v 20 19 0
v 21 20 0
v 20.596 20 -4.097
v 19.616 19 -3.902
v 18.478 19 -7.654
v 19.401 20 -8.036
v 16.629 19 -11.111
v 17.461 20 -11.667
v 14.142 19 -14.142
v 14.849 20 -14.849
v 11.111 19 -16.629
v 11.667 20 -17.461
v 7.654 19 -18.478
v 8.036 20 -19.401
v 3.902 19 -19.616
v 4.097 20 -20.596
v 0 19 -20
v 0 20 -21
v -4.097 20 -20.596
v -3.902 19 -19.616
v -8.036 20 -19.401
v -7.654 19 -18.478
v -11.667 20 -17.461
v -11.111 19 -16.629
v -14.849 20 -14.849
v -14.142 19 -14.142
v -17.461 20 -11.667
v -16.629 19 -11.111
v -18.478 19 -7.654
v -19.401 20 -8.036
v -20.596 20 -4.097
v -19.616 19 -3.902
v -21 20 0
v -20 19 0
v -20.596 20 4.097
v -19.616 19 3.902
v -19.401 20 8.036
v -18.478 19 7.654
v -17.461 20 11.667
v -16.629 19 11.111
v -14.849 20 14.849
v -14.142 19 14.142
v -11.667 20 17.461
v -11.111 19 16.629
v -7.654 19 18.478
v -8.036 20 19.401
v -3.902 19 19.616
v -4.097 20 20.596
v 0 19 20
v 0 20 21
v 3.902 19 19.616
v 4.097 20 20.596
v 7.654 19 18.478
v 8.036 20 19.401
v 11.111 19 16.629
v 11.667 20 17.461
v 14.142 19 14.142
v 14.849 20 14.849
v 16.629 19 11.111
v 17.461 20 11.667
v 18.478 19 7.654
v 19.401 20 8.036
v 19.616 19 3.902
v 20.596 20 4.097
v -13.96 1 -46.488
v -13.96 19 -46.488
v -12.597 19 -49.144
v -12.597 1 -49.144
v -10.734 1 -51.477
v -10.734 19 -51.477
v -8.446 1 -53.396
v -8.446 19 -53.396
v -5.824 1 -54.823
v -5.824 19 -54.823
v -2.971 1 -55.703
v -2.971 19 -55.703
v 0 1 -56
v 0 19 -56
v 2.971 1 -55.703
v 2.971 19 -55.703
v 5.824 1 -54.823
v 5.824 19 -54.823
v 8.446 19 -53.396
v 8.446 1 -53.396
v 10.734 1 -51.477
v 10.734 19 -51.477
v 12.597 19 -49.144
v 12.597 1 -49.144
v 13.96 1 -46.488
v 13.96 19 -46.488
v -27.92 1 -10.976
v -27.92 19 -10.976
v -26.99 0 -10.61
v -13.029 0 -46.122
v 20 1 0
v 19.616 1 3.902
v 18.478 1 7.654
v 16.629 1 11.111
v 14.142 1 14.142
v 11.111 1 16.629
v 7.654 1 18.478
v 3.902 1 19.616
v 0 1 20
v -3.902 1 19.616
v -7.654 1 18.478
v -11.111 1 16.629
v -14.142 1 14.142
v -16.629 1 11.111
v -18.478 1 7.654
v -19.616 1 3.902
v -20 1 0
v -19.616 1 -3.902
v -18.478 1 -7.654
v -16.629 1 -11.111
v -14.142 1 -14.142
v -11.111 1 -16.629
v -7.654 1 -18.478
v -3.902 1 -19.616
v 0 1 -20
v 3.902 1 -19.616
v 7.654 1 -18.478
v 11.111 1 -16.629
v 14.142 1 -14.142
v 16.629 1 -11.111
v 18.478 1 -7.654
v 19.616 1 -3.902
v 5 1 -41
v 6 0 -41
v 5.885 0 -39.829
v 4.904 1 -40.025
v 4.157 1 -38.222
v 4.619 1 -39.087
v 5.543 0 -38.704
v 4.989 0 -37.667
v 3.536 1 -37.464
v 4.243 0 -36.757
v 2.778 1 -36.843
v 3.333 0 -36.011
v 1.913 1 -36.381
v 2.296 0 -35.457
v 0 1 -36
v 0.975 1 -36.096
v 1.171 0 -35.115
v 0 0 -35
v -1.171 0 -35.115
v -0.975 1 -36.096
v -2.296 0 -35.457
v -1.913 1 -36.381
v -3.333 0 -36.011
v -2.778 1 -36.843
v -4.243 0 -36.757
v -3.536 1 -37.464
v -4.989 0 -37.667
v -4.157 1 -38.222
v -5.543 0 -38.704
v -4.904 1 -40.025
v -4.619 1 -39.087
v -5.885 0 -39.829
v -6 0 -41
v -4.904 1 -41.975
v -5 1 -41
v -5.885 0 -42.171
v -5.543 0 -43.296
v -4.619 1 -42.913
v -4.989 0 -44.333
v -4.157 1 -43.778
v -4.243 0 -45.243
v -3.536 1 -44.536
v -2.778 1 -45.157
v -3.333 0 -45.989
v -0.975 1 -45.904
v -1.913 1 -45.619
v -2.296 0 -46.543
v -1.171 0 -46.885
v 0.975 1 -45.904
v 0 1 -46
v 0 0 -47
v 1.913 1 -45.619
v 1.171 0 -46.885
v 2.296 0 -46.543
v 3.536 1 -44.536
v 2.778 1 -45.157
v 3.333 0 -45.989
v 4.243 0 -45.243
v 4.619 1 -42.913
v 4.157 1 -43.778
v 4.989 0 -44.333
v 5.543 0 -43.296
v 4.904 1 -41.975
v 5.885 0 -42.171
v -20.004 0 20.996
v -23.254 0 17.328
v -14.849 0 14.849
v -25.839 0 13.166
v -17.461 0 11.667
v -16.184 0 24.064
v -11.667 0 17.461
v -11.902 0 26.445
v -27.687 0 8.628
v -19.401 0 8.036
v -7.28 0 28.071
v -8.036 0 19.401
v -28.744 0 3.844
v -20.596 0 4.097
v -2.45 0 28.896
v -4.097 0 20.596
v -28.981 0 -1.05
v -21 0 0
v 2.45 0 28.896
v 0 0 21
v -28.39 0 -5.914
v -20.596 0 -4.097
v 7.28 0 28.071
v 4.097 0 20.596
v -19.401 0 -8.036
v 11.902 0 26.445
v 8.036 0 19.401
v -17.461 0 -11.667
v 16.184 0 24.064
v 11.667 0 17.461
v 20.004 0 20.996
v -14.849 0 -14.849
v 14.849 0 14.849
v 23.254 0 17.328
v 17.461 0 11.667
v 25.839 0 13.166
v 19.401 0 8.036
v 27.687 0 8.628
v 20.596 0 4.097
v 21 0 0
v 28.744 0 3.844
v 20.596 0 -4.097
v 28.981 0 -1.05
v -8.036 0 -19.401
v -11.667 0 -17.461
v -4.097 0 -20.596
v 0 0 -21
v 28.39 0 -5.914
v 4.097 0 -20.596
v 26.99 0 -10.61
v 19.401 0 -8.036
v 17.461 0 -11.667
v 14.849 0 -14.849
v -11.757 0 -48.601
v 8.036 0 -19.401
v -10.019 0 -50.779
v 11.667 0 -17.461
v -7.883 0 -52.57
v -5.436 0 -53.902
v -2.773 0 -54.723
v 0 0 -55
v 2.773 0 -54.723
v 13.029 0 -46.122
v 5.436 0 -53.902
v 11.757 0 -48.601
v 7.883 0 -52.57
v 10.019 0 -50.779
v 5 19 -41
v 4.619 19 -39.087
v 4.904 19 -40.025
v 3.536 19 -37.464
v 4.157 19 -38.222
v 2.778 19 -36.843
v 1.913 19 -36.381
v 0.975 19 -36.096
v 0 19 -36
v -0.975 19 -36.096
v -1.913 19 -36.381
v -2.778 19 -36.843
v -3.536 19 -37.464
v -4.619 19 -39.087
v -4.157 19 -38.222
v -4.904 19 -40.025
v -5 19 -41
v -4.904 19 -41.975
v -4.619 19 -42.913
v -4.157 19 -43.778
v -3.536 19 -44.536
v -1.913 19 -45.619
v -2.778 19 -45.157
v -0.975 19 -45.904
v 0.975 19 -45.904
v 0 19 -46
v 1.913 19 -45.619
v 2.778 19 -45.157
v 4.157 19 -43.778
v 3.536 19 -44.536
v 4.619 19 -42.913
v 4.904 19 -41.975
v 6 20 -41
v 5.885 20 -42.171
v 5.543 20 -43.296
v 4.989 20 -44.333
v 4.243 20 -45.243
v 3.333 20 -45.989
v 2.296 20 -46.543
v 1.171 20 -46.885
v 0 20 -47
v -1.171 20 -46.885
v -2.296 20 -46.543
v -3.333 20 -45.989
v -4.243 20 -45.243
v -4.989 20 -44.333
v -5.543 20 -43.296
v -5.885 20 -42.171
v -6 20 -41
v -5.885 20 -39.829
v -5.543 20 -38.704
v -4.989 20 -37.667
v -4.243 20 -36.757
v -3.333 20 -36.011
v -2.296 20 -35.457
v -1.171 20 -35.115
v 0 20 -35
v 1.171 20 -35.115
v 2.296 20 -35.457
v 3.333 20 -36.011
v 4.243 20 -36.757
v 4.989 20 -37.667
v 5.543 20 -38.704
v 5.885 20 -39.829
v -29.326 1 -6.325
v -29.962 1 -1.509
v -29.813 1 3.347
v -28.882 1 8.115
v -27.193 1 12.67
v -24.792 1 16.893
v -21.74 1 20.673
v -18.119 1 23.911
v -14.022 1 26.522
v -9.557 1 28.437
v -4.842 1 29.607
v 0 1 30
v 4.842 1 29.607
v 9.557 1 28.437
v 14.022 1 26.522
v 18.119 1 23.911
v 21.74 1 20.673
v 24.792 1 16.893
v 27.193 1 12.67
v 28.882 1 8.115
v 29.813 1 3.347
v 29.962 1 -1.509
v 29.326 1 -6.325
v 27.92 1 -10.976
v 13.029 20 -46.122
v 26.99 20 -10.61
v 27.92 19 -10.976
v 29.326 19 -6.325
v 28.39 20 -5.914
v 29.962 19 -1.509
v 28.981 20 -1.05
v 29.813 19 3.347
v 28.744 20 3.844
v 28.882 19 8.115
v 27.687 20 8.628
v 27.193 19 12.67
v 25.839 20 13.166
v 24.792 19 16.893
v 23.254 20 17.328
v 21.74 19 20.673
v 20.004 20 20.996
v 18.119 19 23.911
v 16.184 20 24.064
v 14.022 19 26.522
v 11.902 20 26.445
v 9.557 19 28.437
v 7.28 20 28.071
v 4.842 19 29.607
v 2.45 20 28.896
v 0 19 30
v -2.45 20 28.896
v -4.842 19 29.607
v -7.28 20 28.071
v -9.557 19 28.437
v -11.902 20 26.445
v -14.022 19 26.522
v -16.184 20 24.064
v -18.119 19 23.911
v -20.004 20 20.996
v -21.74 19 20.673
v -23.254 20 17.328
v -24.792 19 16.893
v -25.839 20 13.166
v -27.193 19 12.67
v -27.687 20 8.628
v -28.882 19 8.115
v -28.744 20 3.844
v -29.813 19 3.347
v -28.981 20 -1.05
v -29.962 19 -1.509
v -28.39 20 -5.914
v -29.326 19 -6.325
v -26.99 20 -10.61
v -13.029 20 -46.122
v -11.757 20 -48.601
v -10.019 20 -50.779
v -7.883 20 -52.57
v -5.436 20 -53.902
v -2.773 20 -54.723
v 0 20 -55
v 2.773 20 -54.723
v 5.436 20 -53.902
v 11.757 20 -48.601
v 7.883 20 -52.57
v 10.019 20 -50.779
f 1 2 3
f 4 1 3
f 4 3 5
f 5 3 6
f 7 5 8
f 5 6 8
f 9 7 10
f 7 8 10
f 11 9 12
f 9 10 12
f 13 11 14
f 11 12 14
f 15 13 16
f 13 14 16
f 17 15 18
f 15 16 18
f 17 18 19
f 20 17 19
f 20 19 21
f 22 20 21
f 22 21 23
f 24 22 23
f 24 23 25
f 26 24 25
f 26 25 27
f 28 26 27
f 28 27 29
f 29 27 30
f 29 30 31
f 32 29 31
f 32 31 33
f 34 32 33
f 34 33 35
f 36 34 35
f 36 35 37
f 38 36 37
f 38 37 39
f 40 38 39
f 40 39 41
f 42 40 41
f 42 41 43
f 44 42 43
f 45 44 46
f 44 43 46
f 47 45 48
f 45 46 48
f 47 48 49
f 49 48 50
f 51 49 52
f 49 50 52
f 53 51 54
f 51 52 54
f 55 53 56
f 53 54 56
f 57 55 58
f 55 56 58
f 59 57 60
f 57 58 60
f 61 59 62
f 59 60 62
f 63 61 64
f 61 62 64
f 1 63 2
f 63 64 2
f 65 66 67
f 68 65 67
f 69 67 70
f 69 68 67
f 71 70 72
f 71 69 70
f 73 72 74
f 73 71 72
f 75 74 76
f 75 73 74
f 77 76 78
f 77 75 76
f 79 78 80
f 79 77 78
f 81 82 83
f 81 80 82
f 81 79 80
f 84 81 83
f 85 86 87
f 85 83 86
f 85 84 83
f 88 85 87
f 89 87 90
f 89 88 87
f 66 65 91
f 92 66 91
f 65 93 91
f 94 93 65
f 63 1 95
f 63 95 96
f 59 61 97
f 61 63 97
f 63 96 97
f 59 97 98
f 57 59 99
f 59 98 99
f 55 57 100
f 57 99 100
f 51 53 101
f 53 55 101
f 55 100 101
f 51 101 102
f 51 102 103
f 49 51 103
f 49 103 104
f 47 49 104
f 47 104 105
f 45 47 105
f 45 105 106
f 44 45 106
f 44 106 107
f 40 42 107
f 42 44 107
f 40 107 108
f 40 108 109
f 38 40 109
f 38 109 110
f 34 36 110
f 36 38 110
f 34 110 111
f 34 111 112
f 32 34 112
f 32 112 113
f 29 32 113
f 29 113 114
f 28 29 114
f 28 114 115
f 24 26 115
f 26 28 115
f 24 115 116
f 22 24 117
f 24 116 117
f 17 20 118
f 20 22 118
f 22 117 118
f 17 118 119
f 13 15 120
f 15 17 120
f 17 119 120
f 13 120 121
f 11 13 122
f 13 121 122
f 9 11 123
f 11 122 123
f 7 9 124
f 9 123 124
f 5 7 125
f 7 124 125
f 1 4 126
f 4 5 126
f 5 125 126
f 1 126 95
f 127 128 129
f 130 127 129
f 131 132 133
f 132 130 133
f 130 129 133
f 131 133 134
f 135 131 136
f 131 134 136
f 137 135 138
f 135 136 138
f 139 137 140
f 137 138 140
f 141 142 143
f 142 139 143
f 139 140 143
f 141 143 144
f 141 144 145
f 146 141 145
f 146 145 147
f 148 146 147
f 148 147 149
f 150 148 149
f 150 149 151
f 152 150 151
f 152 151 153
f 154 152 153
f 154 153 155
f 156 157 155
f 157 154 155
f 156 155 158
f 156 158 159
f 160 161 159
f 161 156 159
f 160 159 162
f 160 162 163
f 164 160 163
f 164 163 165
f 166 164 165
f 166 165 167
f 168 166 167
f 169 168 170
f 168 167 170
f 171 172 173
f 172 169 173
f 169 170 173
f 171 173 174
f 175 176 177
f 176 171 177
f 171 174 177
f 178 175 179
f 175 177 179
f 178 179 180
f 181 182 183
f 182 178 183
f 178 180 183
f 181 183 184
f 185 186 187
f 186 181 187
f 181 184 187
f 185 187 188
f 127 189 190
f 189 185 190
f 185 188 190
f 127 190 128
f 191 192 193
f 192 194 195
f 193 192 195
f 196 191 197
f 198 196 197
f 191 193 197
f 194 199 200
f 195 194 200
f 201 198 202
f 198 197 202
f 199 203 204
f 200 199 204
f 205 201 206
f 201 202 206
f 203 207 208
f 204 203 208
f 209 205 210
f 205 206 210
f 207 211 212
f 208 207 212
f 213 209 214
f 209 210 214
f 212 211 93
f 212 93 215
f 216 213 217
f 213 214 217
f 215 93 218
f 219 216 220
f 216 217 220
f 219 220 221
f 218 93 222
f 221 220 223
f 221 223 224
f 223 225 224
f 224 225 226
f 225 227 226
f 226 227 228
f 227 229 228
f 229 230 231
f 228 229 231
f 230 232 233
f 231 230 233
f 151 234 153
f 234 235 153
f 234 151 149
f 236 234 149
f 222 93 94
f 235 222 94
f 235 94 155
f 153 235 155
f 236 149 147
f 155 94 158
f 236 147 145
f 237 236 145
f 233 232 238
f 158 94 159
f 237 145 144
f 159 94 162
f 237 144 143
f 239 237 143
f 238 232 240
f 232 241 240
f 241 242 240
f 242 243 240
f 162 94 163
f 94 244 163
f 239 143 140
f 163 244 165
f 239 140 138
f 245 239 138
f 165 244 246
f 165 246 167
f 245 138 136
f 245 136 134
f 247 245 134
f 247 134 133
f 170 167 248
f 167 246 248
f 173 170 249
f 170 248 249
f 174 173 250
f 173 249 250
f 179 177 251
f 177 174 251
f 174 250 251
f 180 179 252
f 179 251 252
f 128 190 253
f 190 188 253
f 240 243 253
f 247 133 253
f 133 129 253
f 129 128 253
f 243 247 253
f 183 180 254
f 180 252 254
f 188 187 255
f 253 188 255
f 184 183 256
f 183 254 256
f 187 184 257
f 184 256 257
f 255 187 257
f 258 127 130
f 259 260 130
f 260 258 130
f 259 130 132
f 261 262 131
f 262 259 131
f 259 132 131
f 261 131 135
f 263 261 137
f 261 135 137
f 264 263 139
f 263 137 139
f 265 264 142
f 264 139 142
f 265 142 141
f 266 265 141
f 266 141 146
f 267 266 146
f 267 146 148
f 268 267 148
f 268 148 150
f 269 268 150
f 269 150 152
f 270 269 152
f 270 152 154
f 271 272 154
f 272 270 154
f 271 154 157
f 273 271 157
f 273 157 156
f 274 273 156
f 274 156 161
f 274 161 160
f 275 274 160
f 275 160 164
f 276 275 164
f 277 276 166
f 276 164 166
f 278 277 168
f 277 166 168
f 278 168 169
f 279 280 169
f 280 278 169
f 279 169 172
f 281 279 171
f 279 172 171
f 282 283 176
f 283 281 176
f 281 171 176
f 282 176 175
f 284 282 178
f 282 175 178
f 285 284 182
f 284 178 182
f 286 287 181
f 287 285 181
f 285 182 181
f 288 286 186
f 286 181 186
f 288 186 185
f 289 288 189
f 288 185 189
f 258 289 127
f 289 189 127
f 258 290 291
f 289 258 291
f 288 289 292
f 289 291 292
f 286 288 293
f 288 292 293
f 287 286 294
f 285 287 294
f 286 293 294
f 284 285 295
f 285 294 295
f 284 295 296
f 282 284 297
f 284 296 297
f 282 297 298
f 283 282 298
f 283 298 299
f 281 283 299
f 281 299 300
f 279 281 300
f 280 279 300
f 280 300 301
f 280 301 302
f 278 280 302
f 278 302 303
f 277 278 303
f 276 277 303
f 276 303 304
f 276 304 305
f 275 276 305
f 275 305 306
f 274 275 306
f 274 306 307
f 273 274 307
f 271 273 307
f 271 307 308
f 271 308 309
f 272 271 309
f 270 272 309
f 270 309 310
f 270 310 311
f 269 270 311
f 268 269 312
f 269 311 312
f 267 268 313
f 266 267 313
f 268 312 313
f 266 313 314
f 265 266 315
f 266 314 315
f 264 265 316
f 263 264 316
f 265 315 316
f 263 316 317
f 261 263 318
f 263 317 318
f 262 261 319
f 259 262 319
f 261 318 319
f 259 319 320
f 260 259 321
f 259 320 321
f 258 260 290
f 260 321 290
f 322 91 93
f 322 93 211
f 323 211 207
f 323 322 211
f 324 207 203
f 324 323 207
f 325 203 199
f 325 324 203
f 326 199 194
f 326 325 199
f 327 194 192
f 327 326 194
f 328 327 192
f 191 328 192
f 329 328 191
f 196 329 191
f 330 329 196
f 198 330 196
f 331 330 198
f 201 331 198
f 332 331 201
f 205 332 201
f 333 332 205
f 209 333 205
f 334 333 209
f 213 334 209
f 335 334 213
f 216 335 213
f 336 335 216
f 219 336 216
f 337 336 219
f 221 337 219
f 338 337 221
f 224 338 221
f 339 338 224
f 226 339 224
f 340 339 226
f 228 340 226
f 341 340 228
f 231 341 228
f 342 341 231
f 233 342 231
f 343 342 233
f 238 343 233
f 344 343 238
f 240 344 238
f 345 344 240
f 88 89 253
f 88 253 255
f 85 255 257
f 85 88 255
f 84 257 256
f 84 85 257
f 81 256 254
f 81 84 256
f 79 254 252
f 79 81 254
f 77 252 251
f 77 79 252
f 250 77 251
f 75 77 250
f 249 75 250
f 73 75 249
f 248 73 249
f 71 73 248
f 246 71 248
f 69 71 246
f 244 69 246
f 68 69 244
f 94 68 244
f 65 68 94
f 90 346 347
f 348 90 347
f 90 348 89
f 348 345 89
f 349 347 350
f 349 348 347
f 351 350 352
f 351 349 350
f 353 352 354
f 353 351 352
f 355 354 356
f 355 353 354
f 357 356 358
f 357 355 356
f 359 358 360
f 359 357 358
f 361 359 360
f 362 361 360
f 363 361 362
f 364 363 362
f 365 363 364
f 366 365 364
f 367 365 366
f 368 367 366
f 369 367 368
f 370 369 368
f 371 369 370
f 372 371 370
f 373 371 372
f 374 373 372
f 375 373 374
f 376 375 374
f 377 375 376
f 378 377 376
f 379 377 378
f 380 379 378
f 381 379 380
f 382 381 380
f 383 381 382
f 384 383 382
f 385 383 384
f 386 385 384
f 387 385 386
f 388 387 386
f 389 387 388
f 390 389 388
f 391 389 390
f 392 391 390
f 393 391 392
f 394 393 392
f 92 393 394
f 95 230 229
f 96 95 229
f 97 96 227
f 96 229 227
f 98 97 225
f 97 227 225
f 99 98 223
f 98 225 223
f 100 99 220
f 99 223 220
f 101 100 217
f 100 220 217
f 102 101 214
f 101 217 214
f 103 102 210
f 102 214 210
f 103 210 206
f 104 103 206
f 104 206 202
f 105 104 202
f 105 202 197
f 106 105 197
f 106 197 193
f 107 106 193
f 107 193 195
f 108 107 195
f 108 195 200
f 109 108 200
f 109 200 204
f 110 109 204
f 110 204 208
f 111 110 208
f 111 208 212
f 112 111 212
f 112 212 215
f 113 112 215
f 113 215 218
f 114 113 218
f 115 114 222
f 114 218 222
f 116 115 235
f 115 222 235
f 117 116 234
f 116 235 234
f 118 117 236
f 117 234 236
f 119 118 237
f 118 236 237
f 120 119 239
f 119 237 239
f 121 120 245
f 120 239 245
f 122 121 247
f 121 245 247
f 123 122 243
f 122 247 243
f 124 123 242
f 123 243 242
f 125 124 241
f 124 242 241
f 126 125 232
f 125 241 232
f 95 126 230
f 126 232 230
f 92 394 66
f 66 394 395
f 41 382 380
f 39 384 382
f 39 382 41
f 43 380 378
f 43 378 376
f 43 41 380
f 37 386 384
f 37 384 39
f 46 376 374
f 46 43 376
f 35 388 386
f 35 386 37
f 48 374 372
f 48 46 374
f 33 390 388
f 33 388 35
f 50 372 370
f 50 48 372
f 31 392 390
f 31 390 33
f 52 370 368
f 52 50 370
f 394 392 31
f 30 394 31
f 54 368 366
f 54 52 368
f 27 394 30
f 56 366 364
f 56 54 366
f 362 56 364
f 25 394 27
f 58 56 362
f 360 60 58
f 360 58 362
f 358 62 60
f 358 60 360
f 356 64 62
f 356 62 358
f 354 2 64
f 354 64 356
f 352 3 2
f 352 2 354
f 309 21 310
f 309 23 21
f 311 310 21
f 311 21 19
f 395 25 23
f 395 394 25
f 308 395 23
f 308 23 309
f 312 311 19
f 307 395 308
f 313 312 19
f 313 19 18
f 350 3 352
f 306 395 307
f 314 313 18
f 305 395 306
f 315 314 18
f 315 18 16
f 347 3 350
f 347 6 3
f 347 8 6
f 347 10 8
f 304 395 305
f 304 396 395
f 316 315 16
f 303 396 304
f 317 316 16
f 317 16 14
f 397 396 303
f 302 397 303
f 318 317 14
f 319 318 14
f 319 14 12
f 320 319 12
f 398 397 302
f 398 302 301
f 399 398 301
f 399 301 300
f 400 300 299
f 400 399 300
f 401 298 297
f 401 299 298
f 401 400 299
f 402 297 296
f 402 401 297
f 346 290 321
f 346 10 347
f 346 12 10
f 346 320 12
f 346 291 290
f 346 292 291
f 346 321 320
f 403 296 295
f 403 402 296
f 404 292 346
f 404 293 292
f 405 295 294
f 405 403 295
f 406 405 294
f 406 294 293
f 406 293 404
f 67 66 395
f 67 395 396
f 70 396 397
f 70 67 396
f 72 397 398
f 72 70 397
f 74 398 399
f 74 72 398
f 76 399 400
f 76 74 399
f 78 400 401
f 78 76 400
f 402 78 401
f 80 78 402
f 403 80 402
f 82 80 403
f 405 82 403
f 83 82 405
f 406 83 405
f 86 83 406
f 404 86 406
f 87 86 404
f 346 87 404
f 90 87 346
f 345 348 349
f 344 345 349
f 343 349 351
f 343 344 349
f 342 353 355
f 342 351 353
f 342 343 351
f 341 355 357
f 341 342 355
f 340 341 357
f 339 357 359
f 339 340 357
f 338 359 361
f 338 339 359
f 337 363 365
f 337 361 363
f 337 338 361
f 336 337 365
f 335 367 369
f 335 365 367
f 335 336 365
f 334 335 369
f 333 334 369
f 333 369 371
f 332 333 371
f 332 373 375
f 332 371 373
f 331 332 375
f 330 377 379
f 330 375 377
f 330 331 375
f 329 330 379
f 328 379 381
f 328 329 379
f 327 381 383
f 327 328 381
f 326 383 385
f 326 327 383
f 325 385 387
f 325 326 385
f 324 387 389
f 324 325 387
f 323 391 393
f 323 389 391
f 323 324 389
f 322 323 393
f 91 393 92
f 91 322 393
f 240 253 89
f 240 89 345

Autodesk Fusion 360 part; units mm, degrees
sketch "Sketch1" plane through (0, 0, 0) normal (0, 1, 0) x (1, 0, 0)
  circle A0 centre (0, 0) radius 20
  line L0 (-13.9601, 46.4878) -> (-27.9202, 10.9756)
  arc A1 (-27.9202, 10.9756) -> (27.9202, 10.9756) centre (0, 0) ccw
  line L1 (27.9202, 10.9756) -> (13.9601, 46.4878)
  arc A2 (13.9601, 46.4878) -> (-13.9601, 46.4878) centre (0, 41) ccw
  circle A3 centre (0, 41) radius 5
  point P0 (0, -30)
  point P1 (0, 56)
  dimension "d1" = 40
  dimension "d2" = 30
  dimension "d3" = 41
  dimension "d4" = 15
  dimension "d8" = 10
  dimension "d9" = 86
extrude "Extrude1" add sketch "Sketch1" along normal blind 20
chamfer "Chamfer1" distance 1 angle 45 12 edges at (0, 20, -56) (-20.9401, 20, -28.7317) (0, 20, 30) (20.9401, 20, -28.7317) (0, 0, -56) (-20.9401, 0, -28.7317) (0, 0, 30) (20.9401, 0, -28.7317) (-18.6465, 20, -7.2323) (-18.6465, 0, -7.2323) (-4.6616, 20, -42.8081) (-4.6616, 0, -42.8081)
